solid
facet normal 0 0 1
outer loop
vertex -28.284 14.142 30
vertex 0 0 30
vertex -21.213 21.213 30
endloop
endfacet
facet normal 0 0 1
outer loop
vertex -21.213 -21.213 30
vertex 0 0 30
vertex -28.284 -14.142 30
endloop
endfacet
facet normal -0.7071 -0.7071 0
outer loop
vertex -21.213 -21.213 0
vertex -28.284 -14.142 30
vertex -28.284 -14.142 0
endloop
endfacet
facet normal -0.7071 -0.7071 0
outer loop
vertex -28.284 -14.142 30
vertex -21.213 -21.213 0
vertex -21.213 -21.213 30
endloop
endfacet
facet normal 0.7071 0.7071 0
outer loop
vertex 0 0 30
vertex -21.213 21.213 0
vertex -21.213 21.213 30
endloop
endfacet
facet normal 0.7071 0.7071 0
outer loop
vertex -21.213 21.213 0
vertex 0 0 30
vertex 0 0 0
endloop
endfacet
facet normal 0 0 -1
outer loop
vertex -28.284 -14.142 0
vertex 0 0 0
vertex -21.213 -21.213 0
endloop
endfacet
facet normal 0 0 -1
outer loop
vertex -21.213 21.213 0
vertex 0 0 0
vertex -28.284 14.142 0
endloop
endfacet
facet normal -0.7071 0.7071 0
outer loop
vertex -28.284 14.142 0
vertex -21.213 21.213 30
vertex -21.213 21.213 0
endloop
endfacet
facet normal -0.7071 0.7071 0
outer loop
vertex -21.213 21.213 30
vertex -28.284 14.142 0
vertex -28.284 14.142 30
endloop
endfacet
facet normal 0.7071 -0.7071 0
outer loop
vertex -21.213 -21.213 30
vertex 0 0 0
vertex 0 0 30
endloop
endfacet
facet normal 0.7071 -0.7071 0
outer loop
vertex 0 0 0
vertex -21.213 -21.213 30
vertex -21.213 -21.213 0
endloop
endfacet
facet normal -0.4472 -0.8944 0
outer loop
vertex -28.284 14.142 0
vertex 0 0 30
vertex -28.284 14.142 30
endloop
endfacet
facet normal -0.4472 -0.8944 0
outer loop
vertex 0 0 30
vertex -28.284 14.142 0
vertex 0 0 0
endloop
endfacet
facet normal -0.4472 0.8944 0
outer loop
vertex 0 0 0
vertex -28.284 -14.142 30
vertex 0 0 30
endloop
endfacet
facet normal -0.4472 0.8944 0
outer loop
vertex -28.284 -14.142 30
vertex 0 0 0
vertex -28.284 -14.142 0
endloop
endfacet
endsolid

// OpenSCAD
rotate([0,0,90])
rotate([0,-90,0]){
    difference(){
        rotate([-45,0,0]) {
            cube([30, 30, 30]);
        }
        scale([1,2,1]) {
            rotate([-45,0,0]) {
                cube([30, 30, 30]);
            }
        }
    }
}
